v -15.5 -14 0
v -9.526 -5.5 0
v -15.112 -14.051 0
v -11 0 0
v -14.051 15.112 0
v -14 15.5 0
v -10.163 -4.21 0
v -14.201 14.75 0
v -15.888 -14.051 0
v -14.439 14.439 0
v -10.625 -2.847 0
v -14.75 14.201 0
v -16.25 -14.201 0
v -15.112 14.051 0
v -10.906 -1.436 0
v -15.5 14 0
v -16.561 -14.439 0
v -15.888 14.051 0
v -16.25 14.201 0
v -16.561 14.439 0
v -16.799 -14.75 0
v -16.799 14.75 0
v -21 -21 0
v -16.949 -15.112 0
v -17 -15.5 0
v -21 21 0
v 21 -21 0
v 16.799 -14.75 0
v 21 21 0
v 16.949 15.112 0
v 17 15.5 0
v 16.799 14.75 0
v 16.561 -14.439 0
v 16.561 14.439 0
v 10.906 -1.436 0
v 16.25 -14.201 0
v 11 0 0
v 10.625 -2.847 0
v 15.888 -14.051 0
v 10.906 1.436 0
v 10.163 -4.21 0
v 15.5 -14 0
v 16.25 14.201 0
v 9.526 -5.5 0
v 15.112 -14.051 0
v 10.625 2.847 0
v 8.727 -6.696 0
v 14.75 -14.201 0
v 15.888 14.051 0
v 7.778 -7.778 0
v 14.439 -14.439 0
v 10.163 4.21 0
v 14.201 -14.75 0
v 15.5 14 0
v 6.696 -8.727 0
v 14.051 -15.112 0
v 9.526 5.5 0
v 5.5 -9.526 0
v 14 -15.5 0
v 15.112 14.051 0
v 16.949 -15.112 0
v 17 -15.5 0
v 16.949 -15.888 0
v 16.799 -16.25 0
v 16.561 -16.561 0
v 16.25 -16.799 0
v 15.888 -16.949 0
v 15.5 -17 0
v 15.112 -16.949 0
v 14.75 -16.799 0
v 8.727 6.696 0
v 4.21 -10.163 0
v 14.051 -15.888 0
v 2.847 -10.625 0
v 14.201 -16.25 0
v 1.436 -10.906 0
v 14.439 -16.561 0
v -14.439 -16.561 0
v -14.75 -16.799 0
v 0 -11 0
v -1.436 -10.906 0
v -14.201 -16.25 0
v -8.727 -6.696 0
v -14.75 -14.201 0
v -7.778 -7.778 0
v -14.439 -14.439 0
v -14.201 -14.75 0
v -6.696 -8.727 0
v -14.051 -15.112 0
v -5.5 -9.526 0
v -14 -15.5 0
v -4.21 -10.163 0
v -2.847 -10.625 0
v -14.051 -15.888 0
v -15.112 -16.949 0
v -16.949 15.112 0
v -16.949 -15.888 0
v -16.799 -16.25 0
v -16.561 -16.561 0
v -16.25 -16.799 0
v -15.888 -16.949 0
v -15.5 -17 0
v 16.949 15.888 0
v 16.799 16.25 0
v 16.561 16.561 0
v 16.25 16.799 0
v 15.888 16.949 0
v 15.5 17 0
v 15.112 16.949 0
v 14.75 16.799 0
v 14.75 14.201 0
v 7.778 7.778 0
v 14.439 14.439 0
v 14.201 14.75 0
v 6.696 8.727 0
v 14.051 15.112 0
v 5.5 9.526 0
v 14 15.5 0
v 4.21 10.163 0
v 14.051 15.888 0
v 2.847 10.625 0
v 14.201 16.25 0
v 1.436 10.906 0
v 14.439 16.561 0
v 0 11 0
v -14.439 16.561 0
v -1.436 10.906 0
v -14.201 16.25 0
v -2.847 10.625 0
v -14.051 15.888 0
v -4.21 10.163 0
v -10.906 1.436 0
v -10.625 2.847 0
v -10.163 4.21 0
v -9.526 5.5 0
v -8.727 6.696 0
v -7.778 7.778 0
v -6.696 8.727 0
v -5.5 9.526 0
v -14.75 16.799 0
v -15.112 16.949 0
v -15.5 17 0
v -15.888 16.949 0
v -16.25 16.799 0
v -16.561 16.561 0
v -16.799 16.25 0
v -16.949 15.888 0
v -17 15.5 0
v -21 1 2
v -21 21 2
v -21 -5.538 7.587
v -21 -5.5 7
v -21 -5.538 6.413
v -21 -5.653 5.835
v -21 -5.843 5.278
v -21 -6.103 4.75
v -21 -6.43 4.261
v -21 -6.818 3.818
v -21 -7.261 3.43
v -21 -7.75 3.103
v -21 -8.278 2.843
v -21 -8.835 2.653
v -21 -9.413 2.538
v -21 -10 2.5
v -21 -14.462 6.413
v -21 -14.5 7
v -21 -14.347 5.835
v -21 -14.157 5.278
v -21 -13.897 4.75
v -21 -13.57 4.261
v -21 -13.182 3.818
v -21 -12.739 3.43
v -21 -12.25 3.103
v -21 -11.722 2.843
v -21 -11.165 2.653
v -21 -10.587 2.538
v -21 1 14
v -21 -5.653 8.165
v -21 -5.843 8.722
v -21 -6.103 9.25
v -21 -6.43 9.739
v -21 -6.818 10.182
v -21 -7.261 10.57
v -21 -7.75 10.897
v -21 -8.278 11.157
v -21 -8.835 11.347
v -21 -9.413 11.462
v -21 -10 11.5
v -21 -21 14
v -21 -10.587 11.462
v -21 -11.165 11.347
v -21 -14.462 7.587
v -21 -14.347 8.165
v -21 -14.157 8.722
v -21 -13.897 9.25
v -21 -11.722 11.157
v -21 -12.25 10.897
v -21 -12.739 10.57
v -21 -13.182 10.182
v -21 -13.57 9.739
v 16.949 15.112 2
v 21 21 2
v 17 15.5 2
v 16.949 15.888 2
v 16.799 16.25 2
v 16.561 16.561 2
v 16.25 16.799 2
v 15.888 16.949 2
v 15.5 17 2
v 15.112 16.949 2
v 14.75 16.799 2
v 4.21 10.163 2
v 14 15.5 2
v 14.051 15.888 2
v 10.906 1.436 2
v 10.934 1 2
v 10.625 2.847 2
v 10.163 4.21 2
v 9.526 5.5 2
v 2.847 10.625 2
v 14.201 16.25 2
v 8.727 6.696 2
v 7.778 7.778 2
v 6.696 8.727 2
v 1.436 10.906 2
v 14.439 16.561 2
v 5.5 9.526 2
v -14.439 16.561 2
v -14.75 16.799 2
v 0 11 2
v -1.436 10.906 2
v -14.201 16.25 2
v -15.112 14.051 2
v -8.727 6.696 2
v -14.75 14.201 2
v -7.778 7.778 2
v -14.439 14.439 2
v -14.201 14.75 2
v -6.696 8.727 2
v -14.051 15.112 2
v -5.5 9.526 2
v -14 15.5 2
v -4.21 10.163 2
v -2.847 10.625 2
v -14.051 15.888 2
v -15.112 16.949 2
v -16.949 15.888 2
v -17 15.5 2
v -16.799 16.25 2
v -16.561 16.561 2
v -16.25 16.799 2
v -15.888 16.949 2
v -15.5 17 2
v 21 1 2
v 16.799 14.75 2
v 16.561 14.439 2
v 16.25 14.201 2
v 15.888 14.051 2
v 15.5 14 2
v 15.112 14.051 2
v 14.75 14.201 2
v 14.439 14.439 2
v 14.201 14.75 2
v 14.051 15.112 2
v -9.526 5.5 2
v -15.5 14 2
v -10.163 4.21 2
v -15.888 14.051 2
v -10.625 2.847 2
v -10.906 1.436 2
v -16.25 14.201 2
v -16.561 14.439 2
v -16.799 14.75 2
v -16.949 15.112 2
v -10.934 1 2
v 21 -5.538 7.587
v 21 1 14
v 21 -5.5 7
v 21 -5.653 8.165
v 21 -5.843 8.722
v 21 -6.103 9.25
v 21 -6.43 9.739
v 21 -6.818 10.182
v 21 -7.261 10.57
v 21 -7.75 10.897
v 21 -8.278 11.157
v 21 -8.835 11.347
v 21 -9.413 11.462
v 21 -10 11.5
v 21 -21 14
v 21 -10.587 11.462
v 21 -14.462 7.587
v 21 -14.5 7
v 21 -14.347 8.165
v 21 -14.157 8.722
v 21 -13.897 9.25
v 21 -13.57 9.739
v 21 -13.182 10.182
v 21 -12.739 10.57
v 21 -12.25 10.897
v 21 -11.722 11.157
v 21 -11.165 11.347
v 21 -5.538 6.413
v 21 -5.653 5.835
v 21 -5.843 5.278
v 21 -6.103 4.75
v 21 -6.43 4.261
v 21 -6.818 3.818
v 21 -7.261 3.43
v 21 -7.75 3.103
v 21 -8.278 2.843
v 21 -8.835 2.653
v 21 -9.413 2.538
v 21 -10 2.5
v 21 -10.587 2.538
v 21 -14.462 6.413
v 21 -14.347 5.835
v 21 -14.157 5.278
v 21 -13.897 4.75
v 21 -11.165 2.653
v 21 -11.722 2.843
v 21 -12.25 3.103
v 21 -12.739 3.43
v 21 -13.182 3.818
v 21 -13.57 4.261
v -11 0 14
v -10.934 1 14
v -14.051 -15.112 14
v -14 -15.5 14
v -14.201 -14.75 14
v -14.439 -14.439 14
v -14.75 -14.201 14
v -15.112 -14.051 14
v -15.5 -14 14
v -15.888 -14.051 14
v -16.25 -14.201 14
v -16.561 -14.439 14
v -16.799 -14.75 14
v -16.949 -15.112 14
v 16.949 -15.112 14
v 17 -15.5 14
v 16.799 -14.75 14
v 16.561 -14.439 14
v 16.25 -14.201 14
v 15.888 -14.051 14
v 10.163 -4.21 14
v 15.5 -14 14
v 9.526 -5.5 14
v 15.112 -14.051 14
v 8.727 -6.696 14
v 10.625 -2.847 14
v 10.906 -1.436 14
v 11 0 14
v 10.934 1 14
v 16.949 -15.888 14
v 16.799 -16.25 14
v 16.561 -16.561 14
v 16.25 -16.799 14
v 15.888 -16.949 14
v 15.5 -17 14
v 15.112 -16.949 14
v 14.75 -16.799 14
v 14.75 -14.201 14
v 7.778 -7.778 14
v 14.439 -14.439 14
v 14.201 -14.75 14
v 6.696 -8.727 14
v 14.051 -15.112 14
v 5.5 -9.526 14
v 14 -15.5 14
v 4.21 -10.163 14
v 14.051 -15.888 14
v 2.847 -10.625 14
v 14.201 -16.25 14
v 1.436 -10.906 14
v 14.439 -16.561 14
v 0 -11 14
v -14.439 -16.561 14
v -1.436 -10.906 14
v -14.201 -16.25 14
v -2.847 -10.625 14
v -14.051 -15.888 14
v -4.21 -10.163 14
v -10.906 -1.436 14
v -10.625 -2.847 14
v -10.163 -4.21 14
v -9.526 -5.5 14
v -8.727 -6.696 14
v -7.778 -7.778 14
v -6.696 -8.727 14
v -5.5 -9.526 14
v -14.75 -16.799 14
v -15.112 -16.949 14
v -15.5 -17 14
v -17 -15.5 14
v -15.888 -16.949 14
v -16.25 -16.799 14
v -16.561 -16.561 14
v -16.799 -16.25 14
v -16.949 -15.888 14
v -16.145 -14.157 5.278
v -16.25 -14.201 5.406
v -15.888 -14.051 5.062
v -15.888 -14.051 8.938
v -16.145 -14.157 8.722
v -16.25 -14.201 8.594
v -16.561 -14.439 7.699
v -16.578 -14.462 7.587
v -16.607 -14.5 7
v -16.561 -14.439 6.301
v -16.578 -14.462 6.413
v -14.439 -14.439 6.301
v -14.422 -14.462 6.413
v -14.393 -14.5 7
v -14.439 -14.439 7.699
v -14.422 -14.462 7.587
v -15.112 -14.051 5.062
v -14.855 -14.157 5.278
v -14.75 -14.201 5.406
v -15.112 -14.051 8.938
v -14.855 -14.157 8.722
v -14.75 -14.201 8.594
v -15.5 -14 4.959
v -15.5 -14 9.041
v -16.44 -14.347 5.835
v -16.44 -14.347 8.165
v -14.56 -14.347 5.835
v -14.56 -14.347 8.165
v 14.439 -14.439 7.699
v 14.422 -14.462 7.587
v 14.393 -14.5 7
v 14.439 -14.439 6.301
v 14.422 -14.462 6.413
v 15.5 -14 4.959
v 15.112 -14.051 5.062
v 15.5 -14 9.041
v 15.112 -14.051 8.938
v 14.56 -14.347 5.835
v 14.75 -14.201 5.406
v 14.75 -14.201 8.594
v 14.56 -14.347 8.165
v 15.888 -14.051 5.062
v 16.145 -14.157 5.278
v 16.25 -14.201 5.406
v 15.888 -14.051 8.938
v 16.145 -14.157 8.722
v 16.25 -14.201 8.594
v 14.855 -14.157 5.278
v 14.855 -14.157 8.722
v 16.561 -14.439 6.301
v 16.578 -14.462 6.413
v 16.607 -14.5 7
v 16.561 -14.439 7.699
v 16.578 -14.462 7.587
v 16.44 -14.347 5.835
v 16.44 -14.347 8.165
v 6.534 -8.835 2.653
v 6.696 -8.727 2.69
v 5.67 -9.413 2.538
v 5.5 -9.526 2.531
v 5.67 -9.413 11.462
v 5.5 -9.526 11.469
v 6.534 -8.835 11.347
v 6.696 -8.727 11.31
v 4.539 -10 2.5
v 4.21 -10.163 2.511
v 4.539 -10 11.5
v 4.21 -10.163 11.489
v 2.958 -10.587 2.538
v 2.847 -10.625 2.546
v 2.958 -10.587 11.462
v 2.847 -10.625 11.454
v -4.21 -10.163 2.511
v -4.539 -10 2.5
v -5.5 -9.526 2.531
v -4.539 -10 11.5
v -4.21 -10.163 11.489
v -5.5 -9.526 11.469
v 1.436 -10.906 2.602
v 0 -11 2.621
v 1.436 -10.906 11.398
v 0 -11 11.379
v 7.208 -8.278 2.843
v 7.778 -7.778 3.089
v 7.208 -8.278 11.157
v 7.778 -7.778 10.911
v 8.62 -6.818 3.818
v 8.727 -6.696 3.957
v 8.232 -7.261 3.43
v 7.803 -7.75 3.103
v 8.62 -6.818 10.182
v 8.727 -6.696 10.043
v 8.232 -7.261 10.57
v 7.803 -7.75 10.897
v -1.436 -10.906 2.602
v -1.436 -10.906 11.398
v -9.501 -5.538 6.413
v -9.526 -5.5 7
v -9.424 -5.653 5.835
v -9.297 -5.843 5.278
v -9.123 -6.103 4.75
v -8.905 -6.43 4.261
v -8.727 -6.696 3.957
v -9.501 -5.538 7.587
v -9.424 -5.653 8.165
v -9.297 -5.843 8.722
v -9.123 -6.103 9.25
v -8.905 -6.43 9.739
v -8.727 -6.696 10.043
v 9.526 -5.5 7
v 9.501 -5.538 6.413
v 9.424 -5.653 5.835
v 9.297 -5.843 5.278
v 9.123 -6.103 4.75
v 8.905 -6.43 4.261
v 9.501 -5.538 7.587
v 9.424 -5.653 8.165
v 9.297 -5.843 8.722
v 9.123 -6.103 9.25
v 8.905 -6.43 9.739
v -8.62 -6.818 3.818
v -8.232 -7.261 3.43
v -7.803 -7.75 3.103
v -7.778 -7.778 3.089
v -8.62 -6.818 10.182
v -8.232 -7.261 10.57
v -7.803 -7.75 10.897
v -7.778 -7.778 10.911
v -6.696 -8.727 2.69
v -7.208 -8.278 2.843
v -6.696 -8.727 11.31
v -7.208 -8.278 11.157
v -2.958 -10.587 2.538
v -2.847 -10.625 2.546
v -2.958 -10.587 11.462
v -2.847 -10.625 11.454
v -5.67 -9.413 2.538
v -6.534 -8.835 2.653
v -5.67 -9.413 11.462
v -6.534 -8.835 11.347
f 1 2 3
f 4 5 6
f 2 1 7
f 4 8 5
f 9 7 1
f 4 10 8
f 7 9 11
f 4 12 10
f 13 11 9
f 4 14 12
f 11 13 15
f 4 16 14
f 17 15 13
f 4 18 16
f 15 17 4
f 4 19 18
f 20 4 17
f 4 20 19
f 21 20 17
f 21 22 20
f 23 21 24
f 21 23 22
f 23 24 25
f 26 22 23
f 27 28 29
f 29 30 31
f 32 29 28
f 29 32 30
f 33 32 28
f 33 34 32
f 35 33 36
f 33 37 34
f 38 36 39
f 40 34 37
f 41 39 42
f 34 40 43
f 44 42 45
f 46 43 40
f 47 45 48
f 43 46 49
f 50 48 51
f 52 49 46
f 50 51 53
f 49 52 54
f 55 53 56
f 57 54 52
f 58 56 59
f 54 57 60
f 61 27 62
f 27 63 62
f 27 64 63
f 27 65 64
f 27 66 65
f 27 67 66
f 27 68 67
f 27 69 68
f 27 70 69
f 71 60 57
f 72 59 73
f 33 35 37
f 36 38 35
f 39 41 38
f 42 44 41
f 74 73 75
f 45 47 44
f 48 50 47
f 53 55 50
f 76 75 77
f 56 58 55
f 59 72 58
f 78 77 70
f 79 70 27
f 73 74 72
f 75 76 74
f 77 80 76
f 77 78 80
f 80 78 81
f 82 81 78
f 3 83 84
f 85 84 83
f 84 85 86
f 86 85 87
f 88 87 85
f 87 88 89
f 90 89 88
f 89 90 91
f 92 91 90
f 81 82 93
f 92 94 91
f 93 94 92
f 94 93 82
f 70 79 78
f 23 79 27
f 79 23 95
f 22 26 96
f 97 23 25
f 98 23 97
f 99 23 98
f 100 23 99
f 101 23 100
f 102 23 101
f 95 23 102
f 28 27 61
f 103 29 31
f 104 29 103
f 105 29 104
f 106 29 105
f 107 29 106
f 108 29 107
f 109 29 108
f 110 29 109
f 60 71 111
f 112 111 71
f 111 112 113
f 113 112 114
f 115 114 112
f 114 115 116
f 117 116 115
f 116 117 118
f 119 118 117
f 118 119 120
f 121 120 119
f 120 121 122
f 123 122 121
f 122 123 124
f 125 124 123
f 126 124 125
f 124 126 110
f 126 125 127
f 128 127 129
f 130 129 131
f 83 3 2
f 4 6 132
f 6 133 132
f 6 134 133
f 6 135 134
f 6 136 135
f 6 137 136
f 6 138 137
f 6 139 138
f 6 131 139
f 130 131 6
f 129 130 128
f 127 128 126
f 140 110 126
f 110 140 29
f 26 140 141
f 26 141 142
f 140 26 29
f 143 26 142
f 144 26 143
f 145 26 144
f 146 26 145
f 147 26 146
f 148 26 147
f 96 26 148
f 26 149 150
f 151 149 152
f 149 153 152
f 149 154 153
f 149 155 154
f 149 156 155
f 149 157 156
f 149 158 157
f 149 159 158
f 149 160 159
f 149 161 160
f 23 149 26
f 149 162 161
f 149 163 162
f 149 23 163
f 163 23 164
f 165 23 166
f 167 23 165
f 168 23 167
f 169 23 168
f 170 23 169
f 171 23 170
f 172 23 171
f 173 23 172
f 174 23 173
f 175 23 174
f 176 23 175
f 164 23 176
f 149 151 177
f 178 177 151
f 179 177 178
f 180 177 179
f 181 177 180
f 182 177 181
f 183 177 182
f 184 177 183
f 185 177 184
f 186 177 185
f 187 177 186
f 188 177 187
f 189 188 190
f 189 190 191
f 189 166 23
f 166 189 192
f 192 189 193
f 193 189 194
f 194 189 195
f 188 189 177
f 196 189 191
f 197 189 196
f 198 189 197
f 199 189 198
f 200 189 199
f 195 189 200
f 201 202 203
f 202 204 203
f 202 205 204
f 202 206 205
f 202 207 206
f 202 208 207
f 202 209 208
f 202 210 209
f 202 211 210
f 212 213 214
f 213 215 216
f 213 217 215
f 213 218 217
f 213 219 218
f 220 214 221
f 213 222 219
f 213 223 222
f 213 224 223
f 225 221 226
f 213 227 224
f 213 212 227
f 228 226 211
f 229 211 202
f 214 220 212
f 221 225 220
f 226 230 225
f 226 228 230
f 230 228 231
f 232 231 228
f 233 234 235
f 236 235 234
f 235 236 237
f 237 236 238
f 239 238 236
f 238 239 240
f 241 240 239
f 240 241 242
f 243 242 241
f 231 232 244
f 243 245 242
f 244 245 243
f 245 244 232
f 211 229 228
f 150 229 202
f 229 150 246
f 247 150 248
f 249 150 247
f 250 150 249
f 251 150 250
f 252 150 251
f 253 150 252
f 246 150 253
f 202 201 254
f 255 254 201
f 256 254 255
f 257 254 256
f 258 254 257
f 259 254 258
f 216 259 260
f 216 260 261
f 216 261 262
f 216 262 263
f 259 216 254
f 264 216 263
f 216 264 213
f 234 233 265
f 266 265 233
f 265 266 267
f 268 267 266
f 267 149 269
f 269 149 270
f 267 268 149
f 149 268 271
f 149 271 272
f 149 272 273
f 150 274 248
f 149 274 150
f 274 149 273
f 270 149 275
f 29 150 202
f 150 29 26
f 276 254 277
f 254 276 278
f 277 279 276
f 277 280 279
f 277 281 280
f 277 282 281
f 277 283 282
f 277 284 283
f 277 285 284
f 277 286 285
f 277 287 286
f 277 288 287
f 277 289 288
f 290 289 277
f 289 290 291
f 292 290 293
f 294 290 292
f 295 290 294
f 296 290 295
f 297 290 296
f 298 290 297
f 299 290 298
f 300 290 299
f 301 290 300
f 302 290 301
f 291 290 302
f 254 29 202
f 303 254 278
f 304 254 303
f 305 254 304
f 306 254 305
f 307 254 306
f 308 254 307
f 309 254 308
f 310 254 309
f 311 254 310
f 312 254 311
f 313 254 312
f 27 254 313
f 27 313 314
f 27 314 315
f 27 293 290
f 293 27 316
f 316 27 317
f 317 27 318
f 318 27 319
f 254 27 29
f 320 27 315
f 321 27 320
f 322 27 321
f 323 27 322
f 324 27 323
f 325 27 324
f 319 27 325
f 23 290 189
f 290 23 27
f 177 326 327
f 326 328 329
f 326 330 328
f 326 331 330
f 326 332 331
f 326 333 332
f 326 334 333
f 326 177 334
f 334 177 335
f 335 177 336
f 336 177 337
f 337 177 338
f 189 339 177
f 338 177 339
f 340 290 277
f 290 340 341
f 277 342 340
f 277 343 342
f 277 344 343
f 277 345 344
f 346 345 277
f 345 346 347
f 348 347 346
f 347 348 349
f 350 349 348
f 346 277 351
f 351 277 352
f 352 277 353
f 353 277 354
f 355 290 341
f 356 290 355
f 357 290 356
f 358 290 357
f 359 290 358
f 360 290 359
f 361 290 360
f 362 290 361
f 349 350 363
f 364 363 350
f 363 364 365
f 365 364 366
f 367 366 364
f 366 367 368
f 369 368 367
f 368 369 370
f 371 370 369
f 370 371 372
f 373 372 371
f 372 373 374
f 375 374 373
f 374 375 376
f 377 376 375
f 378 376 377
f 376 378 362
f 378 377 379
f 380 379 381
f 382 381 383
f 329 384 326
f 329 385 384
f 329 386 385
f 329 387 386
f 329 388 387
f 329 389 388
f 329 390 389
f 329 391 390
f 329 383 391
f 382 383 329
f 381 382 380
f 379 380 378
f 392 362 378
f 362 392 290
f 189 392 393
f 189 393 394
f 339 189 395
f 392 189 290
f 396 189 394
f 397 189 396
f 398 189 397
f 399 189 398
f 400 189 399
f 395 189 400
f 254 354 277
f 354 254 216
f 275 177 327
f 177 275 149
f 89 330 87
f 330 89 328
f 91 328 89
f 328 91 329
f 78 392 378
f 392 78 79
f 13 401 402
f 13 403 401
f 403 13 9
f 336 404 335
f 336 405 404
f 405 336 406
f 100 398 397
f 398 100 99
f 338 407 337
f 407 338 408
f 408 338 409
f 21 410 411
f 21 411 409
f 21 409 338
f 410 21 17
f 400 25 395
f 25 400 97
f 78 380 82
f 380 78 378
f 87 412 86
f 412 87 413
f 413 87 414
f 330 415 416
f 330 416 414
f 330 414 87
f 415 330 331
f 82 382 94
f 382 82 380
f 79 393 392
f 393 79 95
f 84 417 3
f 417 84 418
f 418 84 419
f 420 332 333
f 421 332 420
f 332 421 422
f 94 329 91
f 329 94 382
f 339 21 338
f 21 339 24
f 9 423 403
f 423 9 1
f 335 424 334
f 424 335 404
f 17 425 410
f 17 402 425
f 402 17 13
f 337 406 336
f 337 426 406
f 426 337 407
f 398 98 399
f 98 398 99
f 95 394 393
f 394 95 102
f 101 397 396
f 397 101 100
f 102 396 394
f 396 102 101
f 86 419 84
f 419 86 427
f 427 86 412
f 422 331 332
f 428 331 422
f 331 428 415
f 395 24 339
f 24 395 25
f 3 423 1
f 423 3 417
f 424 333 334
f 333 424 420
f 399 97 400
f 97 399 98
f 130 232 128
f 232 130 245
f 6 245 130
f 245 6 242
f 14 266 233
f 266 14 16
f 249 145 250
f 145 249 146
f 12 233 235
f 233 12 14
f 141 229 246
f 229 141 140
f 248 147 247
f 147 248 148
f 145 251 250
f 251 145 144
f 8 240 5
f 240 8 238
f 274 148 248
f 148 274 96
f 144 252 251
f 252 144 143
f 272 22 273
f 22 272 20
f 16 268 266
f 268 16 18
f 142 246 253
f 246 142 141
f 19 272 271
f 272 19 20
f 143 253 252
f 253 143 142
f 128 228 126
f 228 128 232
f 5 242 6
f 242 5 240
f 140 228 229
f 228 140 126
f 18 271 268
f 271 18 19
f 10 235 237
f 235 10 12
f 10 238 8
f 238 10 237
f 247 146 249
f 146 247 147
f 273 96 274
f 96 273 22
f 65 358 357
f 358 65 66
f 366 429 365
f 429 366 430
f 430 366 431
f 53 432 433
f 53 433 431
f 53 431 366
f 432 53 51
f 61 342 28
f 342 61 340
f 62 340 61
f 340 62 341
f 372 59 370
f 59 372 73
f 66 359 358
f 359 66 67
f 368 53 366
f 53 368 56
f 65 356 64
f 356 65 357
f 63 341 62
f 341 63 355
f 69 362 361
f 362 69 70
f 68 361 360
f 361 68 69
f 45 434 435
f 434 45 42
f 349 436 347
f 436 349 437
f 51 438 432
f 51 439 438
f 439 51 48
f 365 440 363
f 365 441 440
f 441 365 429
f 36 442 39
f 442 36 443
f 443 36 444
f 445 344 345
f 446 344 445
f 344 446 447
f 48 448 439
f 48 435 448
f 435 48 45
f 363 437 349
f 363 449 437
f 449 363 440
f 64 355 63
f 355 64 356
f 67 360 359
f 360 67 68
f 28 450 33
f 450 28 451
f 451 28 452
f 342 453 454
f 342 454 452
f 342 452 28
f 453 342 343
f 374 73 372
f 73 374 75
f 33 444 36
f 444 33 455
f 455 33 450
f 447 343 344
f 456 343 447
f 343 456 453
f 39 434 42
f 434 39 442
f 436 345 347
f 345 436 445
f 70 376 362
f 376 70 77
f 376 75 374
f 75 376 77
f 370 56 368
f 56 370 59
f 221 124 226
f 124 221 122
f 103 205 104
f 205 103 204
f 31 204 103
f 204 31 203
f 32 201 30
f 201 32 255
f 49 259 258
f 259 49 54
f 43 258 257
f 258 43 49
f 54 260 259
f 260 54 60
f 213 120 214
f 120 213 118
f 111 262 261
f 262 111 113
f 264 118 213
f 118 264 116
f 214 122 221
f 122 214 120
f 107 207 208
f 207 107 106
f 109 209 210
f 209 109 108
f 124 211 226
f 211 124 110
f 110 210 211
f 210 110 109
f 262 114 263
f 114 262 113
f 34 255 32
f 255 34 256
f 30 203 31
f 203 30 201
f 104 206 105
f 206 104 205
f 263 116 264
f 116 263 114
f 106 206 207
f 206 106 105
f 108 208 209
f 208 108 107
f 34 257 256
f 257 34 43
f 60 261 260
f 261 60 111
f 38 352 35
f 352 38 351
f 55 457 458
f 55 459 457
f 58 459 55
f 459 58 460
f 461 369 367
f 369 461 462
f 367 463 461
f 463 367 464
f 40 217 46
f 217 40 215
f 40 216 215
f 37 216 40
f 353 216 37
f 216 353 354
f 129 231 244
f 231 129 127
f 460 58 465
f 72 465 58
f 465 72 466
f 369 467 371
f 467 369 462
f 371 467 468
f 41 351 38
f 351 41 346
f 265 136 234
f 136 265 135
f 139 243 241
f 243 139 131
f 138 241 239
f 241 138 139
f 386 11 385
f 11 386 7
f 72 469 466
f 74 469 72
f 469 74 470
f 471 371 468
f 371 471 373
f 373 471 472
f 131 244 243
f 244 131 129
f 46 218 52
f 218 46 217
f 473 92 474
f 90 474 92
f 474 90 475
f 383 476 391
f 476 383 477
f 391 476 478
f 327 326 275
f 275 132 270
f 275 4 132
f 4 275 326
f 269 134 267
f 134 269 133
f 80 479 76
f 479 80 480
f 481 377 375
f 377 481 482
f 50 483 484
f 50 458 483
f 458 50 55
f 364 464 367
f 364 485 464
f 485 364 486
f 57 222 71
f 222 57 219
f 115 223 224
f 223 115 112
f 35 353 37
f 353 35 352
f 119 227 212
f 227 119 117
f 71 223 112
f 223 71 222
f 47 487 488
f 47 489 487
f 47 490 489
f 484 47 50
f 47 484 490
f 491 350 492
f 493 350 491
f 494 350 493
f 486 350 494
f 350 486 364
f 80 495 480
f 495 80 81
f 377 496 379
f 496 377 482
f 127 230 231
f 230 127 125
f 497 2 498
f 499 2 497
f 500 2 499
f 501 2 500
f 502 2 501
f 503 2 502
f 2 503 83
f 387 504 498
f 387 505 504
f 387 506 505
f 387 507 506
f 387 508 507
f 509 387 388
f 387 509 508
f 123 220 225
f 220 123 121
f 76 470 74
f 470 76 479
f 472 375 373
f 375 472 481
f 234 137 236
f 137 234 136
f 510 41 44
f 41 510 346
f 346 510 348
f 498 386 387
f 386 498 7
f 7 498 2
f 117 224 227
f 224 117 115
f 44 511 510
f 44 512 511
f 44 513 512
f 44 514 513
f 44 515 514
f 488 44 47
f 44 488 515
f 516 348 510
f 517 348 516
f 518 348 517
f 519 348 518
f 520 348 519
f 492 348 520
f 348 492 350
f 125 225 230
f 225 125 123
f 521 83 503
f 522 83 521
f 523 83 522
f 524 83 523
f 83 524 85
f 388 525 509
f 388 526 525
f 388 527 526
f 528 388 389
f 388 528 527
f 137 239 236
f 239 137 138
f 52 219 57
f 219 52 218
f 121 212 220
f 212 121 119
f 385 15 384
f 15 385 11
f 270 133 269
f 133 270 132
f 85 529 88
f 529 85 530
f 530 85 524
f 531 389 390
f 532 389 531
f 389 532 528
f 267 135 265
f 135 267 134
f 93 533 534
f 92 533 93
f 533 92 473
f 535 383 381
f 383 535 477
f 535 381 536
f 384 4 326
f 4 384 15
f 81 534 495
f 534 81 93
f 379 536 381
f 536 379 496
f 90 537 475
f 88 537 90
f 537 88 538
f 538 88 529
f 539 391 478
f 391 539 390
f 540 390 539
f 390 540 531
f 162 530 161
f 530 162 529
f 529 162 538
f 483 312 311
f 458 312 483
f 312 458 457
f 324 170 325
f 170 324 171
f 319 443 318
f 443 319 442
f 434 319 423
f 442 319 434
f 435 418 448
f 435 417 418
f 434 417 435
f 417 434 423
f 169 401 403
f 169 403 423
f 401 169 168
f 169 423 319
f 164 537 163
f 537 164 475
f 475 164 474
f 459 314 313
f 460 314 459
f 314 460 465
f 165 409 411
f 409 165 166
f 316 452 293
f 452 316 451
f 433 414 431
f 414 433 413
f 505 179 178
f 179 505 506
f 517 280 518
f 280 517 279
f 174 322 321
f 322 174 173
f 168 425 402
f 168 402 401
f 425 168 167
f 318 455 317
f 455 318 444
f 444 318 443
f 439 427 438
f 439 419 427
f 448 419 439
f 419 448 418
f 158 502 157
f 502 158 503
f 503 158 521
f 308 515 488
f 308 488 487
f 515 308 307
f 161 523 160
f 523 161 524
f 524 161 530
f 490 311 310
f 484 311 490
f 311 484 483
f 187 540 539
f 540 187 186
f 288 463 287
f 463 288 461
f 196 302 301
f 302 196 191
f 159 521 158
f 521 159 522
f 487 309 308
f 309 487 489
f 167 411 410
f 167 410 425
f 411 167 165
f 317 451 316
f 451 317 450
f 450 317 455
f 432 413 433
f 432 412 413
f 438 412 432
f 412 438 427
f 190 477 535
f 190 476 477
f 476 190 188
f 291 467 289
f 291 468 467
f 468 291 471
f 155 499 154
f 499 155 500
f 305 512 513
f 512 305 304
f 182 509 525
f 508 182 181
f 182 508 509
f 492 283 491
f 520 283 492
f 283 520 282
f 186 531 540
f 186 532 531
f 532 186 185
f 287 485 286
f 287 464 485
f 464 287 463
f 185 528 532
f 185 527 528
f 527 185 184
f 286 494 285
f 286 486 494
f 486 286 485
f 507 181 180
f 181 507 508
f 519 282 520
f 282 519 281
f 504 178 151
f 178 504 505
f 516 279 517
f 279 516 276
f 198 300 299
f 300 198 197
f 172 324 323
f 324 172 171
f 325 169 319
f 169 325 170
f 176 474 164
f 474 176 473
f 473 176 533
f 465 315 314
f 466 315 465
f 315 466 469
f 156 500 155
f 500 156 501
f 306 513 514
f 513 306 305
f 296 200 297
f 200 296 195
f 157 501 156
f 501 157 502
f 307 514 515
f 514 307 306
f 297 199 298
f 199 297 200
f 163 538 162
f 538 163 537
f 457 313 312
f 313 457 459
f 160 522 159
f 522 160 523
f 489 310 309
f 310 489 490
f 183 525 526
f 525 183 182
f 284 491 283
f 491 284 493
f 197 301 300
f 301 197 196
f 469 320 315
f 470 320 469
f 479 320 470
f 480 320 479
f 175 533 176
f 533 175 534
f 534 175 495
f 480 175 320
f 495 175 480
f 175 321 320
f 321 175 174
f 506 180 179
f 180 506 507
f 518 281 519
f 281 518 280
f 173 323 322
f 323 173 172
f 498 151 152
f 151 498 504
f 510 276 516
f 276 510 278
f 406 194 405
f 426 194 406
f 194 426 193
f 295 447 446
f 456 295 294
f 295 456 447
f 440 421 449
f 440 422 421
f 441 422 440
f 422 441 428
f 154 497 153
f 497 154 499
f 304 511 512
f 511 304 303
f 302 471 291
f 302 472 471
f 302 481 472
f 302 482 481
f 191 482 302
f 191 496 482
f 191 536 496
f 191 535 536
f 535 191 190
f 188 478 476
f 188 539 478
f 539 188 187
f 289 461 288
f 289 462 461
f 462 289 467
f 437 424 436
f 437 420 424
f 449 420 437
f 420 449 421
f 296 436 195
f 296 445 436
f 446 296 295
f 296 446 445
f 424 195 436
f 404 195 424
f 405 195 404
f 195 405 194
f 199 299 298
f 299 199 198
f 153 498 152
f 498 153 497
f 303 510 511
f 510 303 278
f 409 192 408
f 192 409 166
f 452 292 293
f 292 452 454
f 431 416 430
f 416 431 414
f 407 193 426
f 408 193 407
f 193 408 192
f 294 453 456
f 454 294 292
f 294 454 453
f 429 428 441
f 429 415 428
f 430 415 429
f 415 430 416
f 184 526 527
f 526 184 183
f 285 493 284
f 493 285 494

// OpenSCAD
// A transparent part with internal cavities, for layer-ordering.
//
// The shape matters. A convex transparent solid cannot test ordering at all:
// two layers of the same shaded color composite to the same result in either
// order, and measured, a cube and a plain tube agree on mean, p10, p90 and peak
// brightness whichever order they are drawn in. What makes order visible is
// several shells at different depths whose normals differ strongly - here a
// thin plate unioned with a taller block, bored through vertically and again
// horizontally, so a view ray crosses four or six differently-lit surfaces.
//
// Distilled from the part that exposed the bug in the wild, the extruder body
// in a user's hot-end illustration.
color([.2, .2, .2, .8]) difference() {
  union() {
    linear_extrude(2) square(42, center = true);
    linear_extrude(14) translate([-21, -21]) square([42, 22]);
  }
  cylinder(d = 22, h = 40, center = true, $fn = 48);
  translate([0, -10, 7]) rotate([0, 90, 0]) cylinder(d = 9, h = 60, center = true, $fn = 48);
  for (x = [-1, 1], y = [-1, 1]) translate([x * 15.5, y * 15.5, 0]) cylinder(d = 3, h = 40, center = true, $fn = 24);
}
